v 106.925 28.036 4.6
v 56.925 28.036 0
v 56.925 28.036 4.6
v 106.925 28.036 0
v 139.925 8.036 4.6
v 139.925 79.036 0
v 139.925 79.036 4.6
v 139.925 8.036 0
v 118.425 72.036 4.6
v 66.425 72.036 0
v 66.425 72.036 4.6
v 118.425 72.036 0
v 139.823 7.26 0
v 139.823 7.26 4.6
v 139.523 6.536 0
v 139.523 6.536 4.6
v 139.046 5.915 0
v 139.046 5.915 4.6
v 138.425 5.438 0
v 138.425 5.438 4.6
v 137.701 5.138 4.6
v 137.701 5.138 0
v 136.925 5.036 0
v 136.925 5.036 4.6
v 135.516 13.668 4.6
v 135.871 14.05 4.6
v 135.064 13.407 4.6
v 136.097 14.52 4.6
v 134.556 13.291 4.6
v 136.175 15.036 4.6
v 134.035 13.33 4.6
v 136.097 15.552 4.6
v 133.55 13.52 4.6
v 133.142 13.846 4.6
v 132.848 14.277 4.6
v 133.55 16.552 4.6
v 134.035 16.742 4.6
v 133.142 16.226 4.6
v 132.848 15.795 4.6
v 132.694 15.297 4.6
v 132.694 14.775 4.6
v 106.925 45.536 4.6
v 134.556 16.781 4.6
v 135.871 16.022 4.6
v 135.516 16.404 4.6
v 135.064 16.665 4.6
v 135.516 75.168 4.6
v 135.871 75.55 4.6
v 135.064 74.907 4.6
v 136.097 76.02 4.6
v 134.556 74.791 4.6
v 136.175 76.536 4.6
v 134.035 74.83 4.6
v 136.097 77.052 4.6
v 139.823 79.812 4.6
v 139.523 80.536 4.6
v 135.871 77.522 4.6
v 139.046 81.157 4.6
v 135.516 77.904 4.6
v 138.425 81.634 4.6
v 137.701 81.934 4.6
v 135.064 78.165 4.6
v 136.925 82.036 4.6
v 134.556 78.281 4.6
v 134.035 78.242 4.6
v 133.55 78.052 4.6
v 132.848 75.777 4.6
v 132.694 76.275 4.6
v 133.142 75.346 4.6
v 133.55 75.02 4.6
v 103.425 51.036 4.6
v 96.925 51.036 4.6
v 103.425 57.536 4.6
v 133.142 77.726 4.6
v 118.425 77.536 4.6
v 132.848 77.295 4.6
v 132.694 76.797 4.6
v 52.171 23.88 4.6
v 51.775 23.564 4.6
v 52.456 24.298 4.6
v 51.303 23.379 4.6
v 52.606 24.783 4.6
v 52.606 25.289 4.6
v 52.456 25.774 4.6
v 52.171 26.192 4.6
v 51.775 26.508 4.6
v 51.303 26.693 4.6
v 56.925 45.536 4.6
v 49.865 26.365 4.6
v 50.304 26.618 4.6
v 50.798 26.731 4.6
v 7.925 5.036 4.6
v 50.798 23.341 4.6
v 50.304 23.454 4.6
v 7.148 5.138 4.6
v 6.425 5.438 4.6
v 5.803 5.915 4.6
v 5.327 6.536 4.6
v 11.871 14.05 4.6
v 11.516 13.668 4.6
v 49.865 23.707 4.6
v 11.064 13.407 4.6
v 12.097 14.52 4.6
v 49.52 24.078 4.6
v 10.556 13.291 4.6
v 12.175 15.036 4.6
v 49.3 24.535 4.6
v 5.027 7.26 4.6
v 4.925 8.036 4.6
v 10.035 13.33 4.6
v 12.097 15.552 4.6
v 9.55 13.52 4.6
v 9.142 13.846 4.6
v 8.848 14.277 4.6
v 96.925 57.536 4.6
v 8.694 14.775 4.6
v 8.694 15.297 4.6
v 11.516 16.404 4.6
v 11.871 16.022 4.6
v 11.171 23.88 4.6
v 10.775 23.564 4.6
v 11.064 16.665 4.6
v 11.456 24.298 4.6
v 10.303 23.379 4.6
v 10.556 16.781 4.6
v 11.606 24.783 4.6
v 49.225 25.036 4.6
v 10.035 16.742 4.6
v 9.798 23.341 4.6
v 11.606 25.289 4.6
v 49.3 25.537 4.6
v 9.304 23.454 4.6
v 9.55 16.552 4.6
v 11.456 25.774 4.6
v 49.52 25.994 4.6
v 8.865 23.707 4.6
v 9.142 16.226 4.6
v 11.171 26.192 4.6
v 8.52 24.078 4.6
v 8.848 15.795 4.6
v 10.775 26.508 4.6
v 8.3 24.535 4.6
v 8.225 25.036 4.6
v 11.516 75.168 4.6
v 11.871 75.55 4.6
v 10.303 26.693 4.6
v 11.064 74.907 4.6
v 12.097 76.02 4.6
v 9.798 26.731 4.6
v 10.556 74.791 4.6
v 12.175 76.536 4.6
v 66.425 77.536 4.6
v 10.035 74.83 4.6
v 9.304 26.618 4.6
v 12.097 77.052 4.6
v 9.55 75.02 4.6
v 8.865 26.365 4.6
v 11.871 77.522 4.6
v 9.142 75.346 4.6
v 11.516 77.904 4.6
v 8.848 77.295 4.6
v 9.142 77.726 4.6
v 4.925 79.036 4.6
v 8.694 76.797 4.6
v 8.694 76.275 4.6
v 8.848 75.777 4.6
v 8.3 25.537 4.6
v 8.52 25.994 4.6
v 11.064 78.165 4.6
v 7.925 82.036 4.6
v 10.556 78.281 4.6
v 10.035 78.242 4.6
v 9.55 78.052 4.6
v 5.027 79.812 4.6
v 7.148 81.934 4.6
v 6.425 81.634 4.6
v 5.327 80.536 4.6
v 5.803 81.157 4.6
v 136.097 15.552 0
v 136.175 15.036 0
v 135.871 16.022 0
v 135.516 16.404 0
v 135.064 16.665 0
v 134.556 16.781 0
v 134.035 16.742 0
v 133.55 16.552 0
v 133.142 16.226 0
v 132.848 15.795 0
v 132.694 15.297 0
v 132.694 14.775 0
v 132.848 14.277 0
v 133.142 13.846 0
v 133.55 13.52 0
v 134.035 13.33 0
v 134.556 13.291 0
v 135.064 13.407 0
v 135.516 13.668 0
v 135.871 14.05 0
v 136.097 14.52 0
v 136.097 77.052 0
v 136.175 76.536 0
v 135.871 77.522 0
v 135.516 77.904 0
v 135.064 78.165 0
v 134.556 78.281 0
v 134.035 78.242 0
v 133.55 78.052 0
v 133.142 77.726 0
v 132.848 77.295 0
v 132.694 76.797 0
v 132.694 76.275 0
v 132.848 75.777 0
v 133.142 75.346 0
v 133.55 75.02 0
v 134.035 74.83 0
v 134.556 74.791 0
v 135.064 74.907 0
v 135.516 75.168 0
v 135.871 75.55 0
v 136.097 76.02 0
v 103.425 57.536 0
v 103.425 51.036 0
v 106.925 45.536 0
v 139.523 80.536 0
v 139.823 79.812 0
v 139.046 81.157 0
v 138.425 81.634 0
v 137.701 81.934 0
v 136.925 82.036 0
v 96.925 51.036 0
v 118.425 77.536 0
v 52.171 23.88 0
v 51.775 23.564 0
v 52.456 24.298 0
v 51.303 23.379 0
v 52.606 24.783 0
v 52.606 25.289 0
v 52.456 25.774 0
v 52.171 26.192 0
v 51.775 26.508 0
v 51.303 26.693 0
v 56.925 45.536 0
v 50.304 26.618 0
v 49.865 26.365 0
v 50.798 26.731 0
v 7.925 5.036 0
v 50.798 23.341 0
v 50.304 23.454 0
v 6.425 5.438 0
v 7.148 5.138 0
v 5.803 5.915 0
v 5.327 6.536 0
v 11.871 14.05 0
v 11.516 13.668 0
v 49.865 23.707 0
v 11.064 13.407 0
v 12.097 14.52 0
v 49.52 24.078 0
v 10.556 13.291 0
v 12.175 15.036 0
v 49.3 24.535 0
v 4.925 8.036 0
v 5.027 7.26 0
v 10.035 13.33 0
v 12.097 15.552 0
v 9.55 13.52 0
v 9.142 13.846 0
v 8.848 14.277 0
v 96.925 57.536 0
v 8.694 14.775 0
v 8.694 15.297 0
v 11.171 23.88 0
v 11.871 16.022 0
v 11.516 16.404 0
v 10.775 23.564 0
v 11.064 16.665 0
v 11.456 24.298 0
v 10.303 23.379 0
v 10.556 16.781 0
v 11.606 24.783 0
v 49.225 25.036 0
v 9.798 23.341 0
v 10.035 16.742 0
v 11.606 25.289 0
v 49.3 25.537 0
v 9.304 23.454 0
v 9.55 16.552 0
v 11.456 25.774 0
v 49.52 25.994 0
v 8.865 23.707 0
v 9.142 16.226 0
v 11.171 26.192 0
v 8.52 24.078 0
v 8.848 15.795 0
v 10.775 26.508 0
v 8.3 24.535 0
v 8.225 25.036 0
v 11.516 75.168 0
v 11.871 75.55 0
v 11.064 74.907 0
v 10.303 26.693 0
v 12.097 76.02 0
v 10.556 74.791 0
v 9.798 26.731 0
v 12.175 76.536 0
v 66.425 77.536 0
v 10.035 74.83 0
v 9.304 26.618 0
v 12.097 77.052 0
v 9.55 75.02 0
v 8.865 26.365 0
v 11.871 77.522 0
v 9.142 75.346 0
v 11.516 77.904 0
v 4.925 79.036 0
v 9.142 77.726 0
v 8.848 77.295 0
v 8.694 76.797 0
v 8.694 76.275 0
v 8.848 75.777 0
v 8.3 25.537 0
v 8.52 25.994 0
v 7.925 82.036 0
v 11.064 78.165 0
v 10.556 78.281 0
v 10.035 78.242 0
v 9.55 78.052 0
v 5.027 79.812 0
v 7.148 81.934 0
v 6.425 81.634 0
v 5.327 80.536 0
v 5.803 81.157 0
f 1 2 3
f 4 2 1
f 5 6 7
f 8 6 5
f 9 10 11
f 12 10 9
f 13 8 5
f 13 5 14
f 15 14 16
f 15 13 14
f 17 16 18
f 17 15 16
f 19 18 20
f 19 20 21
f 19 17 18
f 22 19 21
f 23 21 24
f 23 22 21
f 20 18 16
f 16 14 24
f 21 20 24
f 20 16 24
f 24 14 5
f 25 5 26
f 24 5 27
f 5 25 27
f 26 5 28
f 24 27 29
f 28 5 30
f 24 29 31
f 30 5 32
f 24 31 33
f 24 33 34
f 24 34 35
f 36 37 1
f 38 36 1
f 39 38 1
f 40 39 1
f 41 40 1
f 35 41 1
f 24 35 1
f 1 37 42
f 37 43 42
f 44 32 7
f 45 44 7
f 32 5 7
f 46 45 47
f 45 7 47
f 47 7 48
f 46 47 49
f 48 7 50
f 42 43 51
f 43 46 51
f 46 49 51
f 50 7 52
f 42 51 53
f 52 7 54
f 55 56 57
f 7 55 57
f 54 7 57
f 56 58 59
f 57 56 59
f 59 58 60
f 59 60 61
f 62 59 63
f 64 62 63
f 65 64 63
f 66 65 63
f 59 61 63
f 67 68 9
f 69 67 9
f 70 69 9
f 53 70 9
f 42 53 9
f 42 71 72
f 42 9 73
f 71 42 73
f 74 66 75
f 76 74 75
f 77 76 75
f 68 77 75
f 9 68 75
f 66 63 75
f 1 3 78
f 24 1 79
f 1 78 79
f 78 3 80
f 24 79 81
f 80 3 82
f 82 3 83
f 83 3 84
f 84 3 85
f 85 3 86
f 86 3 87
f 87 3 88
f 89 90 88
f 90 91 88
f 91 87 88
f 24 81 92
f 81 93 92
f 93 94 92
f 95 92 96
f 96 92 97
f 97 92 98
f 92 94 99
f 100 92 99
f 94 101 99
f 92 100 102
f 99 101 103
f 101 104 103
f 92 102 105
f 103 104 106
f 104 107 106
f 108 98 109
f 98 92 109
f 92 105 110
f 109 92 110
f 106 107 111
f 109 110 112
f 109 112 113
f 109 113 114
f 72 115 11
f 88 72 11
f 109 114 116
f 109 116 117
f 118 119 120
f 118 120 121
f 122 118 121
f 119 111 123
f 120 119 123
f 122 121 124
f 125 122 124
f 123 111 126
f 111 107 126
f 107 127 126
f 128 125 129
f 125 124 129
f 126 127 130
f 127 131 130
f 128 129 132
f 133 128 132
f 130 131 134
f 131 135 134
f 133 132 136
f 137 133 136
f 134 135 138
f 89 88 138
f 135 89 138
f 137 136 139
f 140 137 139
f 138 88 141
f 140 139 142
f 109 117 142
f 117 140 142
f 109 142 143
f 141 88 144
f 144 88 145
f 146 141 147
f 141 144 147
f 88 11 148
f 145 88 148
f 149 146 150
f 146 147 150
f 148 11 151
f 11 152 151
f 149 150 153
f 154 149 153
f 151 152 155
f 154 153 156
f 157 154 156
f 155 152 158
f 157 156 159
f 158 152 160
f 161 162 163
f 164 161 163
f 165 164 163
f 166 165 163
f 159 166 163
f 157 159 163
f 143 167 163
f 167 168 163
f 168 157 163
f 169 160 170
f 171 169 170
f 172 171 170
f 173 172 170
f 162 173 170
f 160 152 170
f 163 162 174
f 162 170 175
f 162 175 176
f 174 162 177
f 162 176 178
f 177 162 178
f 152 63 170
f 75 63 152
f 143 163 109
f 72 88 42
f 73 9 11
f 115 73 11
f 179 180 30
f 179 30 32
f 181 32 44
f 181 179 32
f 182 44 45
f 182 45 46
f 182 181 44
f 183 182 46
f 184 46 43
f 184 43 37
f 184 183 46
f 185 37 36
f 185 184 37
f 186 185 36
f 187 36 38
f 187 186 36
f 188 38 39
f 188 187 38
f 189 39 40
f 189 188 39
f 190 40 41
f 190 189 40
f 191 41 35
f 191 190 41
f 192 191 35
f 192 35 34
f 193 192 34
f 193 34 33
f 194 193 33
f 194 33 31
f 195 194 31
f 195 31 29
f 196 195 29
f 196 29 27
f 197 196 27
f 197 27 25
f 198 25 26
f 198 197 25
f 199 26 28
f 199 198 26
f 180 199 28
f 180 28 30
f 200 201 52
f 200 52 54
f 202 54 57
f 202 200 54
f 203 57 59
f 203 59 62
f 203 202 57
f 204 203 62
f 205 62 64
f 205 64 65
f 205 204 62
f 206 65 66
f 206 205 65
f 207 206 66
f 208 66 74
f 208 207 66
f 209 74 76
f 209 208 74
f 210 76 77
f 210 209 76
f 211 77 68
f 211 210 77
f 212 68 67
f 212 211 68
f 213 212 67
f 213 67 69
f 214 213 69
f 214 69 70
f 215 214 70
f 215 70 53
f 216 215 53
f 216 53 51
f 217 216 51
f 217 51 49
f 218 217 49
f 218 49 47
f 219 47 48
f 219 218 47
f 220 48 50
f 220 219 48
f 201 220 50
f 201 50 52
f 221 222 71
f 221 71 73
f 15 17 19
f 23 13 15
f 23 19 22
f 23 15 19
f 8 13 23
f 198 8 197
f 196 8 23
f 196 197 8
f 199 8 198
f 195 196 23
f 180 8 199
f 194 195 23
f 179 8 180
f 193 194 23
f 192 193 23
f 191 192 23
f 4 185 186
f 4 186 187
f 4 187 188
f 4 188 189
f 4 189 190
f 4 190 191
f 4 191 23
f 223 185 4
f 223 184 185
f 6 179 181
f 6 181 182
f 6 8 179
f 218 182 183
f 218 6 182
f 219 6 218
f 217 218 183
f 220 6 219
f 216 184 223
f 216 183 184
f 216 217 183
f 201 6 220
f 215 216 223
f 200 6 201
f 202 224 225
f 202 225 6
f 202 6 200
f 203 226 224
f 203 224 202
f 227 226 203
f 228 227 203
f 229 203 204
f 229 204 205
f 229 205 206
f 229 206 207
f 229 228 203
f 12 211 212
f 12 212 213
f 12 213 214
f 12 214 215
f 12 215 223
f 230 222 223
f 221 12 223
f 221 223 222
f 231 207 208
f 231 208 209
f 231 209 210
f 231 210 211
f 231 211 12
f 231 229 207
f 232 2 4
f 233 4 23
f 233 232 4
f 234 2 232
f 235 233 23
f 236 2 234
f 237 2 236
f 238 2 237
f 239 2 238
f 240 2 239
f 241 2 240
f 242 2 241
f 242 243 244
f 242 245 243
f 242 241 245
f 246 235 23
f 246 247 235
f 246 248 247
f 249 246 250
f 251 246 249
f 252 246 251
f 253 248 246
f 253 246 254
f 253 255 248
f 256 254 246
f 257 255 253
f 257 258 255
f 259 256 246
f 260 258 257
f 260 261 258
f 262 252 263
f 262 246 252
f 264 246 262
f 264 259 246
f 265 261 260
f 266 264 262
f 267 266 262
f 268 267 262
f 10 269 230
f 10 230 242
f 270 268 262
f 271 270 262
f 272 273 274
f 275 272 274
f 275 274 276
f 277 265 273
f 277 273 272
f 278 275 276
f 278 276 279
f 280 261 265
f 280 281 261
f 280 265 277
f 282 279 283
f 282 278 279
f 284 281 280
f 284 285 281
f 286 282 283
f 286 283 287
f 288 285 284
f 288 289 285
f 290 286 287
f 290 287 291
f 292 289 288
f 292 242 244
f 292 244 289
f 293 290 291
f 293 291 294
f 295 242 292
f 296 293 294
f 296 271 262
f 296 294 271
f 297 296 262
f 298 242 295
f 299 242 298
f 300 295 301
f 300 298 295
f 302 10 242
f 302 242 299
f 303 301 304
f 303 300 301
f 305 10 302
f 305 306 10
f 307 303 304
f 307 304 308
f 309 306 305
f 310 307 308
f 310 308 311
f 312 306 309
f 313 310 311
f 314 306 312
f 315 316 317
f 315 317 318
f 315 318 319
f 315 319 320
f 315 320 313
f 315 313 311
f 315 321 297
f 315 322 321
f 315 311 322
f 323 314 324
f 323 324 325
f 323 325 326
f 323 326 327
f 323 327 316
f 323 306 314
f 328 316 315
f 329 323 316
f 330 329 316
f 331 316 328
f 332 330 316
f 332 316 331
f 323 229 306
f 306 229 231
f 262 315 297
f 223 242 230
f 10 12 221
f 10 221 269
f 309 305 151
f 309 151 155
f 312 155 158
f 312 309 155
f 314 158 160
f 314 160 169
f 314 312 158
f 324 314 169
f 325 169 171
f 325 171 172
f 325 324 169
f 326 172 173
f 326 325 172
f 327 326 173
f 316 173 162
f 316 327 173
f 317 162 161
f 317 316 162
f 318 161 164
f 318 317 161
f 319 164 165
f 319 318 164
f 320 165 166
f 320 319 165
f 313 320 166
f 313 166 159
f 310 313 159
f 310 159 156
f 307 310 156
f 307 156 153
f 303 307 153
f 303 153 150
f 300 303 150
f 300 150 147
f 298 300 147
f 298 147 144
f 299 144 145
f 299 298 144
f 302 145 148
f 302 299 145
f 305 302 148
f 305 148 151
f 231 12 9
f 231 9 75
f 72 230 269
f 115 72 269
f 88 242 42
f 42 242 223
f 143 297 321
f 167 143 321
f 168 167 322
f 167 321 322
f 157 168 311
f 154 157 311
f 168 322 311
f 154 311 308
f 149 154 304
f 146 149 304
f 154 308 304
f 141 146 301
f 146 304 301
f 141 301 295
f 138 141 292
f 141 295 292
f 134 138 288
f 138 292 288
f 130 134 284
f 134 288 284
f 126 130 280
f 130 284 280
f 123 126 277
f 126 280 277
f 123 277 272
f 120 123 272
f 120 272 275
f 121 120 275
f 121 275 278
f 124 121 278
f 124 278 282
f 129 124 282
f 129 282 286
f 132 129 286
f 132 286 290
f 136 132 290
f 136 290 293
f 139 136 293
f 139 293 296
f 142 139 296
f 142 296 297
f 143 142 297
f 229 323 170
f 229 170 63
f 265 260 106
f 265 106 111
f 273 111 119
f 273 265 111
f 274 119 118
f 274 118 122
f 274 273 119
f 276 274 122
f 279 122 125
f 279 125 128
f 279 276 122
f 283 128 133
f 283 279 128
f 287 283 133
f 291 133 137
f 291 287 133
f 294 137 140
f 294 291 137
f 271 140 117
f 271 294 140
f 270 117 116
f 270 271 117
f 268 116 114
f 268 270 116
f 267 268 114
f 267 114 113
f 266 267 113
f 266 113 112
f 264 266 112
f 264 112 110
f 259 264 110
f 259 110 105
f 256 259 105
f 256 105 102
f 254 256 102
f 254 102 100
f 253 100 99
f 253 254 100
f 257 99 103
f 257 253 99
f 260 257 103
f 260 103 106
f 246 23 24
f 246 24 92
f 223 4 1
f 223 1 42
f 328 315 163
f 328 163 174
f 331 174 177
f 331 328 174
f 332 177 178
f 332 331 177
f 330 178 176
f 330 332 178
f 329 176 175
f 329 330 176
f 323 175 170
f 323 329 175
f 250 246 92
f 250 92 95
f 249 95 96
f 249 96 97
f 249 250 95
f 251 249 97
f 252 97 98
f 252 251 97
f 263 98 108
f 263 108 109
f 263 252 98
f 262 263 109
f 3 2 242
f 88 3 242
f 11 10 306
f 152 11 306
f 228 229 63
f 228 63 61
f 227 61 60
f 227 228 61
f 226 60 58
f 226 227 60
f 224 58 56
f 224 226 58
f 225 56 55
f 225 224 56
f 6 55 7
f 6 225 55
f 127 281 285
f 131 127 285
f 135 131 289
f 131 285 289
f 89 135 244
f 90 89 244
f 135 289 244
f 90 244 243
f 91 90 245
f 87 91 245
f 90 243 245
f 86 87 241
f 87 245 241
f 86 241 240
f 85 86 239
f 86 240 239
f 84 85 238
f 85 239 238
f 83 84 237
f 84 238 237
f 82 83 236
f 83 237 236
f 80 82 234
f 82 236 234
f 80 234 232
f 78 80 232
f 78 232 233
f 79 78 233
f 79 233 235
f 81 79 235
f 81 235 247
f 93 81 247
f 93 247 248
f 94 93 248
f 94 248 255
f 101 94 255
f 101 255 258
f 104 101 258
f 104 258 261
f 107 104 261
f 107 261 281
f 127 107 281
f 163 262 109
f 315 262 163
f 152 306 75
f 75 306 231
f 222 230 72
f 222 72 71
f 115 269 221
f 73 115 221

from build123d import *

# Parameters (mm, degrees)
SKETCH1_R          = 1.75
SKETCH1_W          = 52
SKETCH1_H          = 5.5
SKETCH1_W_2        = 50
SKETCH1_H_2        = 17.5
SKETCH1_W_3        = 6.5
SKETCH1_H_3        = 6.5
EXTRUDE1_DEPTH     = 4.6
SKETCH2_R          = 1.7
CUT_EXTRUDE1_DEPTH = 163.26527615


with BuildPart() as part:
    # Sketch1 → Extrude1 (new body)
    with BuildSketch(Plane.XY):
        with BuildLine():
            Line((7.924813653, 82.036006536), (136.924813653, 82.036006536))
            ThreePointArc((136.924813653, 82.036006536), (139.046133996, 81.15732688), (139.924813653, 79.036006536))
            Line((139.924813653, 79.036006536), (139.924813653, 8.036006536))
            ThreePointArc((139.924813653, 8.036006536), (139.046133996, 5.914686193), (136.924813653, 5.036006536))
            Line((136.924813653, 5.036006536), (7.924813653, 5.036006536))
            ThreePointArc((7.924813653, 5.036006536), (5.803493309, 5.914686193), (4.924813653, 8.036006536))
            Line((4.924813653, 8.036006536), (4.924813653, 79.036006536))
            ThreePointArc((4.924813653, 79.036006536), (5.803493309, 81.15732688), (7.924813653, 82.036006536))
        make_face()
        with Locations((134.424813653, 76.536006536)):
            Circle(SKETCH1_R, mode=Mode.SUBTRACT)
        with Locations((10.424813653, 76.536006536)):
            Circle(SKETCH1_R, mode=Mode.SUBTRACT)
        with Locations((10.424813653, 15.036006536)):
            Circle(SKETCH1_R, mode=Mode.SUBTRACT)
        with Locations((134.424813653, 15.036006536)):
            Circle(SKETCH1_R, mode=Mode.SUBTRACT)
        with Locations((92.424813653, 74.786006536)):
            Rectangle(SKETCH1_W, SKETCH1_H, mode=Mode.SUBTRACT)
        with Locations((81.924813653, 36.786006536)):
            Rectangle(SKETCH1_W_2, SKETCH1_H_2, mode=Mode.SUBTRACT)
        with Locations((100.174813653, 54.286006536)):
            Rectangle(SKETCH1_W_3, SKETCH1_H_3, mode=Mode.SUBTRACT)
    extrude(amount=EXTRUDE1_DEPTH)

    # Sketch2 → Cut-Extrude1 (cut, through all)
    with BuildSketch(Plane(origin=(0, 0, 0), x_dir=(-1, 0, 0), z_dir=(0, 0, -1))):
        with Locations((-50.924813653, 25.036006536)):
            Circle(SKETCH2_R)
        with Locations((-9.924813653, 25.036006536)):
            Circle(SKETCH2_R)
    extrude(amount=-CUT_EXTRUDE1_DEPTH, mode=Mode.SUBTRACT)


solid = part.part
